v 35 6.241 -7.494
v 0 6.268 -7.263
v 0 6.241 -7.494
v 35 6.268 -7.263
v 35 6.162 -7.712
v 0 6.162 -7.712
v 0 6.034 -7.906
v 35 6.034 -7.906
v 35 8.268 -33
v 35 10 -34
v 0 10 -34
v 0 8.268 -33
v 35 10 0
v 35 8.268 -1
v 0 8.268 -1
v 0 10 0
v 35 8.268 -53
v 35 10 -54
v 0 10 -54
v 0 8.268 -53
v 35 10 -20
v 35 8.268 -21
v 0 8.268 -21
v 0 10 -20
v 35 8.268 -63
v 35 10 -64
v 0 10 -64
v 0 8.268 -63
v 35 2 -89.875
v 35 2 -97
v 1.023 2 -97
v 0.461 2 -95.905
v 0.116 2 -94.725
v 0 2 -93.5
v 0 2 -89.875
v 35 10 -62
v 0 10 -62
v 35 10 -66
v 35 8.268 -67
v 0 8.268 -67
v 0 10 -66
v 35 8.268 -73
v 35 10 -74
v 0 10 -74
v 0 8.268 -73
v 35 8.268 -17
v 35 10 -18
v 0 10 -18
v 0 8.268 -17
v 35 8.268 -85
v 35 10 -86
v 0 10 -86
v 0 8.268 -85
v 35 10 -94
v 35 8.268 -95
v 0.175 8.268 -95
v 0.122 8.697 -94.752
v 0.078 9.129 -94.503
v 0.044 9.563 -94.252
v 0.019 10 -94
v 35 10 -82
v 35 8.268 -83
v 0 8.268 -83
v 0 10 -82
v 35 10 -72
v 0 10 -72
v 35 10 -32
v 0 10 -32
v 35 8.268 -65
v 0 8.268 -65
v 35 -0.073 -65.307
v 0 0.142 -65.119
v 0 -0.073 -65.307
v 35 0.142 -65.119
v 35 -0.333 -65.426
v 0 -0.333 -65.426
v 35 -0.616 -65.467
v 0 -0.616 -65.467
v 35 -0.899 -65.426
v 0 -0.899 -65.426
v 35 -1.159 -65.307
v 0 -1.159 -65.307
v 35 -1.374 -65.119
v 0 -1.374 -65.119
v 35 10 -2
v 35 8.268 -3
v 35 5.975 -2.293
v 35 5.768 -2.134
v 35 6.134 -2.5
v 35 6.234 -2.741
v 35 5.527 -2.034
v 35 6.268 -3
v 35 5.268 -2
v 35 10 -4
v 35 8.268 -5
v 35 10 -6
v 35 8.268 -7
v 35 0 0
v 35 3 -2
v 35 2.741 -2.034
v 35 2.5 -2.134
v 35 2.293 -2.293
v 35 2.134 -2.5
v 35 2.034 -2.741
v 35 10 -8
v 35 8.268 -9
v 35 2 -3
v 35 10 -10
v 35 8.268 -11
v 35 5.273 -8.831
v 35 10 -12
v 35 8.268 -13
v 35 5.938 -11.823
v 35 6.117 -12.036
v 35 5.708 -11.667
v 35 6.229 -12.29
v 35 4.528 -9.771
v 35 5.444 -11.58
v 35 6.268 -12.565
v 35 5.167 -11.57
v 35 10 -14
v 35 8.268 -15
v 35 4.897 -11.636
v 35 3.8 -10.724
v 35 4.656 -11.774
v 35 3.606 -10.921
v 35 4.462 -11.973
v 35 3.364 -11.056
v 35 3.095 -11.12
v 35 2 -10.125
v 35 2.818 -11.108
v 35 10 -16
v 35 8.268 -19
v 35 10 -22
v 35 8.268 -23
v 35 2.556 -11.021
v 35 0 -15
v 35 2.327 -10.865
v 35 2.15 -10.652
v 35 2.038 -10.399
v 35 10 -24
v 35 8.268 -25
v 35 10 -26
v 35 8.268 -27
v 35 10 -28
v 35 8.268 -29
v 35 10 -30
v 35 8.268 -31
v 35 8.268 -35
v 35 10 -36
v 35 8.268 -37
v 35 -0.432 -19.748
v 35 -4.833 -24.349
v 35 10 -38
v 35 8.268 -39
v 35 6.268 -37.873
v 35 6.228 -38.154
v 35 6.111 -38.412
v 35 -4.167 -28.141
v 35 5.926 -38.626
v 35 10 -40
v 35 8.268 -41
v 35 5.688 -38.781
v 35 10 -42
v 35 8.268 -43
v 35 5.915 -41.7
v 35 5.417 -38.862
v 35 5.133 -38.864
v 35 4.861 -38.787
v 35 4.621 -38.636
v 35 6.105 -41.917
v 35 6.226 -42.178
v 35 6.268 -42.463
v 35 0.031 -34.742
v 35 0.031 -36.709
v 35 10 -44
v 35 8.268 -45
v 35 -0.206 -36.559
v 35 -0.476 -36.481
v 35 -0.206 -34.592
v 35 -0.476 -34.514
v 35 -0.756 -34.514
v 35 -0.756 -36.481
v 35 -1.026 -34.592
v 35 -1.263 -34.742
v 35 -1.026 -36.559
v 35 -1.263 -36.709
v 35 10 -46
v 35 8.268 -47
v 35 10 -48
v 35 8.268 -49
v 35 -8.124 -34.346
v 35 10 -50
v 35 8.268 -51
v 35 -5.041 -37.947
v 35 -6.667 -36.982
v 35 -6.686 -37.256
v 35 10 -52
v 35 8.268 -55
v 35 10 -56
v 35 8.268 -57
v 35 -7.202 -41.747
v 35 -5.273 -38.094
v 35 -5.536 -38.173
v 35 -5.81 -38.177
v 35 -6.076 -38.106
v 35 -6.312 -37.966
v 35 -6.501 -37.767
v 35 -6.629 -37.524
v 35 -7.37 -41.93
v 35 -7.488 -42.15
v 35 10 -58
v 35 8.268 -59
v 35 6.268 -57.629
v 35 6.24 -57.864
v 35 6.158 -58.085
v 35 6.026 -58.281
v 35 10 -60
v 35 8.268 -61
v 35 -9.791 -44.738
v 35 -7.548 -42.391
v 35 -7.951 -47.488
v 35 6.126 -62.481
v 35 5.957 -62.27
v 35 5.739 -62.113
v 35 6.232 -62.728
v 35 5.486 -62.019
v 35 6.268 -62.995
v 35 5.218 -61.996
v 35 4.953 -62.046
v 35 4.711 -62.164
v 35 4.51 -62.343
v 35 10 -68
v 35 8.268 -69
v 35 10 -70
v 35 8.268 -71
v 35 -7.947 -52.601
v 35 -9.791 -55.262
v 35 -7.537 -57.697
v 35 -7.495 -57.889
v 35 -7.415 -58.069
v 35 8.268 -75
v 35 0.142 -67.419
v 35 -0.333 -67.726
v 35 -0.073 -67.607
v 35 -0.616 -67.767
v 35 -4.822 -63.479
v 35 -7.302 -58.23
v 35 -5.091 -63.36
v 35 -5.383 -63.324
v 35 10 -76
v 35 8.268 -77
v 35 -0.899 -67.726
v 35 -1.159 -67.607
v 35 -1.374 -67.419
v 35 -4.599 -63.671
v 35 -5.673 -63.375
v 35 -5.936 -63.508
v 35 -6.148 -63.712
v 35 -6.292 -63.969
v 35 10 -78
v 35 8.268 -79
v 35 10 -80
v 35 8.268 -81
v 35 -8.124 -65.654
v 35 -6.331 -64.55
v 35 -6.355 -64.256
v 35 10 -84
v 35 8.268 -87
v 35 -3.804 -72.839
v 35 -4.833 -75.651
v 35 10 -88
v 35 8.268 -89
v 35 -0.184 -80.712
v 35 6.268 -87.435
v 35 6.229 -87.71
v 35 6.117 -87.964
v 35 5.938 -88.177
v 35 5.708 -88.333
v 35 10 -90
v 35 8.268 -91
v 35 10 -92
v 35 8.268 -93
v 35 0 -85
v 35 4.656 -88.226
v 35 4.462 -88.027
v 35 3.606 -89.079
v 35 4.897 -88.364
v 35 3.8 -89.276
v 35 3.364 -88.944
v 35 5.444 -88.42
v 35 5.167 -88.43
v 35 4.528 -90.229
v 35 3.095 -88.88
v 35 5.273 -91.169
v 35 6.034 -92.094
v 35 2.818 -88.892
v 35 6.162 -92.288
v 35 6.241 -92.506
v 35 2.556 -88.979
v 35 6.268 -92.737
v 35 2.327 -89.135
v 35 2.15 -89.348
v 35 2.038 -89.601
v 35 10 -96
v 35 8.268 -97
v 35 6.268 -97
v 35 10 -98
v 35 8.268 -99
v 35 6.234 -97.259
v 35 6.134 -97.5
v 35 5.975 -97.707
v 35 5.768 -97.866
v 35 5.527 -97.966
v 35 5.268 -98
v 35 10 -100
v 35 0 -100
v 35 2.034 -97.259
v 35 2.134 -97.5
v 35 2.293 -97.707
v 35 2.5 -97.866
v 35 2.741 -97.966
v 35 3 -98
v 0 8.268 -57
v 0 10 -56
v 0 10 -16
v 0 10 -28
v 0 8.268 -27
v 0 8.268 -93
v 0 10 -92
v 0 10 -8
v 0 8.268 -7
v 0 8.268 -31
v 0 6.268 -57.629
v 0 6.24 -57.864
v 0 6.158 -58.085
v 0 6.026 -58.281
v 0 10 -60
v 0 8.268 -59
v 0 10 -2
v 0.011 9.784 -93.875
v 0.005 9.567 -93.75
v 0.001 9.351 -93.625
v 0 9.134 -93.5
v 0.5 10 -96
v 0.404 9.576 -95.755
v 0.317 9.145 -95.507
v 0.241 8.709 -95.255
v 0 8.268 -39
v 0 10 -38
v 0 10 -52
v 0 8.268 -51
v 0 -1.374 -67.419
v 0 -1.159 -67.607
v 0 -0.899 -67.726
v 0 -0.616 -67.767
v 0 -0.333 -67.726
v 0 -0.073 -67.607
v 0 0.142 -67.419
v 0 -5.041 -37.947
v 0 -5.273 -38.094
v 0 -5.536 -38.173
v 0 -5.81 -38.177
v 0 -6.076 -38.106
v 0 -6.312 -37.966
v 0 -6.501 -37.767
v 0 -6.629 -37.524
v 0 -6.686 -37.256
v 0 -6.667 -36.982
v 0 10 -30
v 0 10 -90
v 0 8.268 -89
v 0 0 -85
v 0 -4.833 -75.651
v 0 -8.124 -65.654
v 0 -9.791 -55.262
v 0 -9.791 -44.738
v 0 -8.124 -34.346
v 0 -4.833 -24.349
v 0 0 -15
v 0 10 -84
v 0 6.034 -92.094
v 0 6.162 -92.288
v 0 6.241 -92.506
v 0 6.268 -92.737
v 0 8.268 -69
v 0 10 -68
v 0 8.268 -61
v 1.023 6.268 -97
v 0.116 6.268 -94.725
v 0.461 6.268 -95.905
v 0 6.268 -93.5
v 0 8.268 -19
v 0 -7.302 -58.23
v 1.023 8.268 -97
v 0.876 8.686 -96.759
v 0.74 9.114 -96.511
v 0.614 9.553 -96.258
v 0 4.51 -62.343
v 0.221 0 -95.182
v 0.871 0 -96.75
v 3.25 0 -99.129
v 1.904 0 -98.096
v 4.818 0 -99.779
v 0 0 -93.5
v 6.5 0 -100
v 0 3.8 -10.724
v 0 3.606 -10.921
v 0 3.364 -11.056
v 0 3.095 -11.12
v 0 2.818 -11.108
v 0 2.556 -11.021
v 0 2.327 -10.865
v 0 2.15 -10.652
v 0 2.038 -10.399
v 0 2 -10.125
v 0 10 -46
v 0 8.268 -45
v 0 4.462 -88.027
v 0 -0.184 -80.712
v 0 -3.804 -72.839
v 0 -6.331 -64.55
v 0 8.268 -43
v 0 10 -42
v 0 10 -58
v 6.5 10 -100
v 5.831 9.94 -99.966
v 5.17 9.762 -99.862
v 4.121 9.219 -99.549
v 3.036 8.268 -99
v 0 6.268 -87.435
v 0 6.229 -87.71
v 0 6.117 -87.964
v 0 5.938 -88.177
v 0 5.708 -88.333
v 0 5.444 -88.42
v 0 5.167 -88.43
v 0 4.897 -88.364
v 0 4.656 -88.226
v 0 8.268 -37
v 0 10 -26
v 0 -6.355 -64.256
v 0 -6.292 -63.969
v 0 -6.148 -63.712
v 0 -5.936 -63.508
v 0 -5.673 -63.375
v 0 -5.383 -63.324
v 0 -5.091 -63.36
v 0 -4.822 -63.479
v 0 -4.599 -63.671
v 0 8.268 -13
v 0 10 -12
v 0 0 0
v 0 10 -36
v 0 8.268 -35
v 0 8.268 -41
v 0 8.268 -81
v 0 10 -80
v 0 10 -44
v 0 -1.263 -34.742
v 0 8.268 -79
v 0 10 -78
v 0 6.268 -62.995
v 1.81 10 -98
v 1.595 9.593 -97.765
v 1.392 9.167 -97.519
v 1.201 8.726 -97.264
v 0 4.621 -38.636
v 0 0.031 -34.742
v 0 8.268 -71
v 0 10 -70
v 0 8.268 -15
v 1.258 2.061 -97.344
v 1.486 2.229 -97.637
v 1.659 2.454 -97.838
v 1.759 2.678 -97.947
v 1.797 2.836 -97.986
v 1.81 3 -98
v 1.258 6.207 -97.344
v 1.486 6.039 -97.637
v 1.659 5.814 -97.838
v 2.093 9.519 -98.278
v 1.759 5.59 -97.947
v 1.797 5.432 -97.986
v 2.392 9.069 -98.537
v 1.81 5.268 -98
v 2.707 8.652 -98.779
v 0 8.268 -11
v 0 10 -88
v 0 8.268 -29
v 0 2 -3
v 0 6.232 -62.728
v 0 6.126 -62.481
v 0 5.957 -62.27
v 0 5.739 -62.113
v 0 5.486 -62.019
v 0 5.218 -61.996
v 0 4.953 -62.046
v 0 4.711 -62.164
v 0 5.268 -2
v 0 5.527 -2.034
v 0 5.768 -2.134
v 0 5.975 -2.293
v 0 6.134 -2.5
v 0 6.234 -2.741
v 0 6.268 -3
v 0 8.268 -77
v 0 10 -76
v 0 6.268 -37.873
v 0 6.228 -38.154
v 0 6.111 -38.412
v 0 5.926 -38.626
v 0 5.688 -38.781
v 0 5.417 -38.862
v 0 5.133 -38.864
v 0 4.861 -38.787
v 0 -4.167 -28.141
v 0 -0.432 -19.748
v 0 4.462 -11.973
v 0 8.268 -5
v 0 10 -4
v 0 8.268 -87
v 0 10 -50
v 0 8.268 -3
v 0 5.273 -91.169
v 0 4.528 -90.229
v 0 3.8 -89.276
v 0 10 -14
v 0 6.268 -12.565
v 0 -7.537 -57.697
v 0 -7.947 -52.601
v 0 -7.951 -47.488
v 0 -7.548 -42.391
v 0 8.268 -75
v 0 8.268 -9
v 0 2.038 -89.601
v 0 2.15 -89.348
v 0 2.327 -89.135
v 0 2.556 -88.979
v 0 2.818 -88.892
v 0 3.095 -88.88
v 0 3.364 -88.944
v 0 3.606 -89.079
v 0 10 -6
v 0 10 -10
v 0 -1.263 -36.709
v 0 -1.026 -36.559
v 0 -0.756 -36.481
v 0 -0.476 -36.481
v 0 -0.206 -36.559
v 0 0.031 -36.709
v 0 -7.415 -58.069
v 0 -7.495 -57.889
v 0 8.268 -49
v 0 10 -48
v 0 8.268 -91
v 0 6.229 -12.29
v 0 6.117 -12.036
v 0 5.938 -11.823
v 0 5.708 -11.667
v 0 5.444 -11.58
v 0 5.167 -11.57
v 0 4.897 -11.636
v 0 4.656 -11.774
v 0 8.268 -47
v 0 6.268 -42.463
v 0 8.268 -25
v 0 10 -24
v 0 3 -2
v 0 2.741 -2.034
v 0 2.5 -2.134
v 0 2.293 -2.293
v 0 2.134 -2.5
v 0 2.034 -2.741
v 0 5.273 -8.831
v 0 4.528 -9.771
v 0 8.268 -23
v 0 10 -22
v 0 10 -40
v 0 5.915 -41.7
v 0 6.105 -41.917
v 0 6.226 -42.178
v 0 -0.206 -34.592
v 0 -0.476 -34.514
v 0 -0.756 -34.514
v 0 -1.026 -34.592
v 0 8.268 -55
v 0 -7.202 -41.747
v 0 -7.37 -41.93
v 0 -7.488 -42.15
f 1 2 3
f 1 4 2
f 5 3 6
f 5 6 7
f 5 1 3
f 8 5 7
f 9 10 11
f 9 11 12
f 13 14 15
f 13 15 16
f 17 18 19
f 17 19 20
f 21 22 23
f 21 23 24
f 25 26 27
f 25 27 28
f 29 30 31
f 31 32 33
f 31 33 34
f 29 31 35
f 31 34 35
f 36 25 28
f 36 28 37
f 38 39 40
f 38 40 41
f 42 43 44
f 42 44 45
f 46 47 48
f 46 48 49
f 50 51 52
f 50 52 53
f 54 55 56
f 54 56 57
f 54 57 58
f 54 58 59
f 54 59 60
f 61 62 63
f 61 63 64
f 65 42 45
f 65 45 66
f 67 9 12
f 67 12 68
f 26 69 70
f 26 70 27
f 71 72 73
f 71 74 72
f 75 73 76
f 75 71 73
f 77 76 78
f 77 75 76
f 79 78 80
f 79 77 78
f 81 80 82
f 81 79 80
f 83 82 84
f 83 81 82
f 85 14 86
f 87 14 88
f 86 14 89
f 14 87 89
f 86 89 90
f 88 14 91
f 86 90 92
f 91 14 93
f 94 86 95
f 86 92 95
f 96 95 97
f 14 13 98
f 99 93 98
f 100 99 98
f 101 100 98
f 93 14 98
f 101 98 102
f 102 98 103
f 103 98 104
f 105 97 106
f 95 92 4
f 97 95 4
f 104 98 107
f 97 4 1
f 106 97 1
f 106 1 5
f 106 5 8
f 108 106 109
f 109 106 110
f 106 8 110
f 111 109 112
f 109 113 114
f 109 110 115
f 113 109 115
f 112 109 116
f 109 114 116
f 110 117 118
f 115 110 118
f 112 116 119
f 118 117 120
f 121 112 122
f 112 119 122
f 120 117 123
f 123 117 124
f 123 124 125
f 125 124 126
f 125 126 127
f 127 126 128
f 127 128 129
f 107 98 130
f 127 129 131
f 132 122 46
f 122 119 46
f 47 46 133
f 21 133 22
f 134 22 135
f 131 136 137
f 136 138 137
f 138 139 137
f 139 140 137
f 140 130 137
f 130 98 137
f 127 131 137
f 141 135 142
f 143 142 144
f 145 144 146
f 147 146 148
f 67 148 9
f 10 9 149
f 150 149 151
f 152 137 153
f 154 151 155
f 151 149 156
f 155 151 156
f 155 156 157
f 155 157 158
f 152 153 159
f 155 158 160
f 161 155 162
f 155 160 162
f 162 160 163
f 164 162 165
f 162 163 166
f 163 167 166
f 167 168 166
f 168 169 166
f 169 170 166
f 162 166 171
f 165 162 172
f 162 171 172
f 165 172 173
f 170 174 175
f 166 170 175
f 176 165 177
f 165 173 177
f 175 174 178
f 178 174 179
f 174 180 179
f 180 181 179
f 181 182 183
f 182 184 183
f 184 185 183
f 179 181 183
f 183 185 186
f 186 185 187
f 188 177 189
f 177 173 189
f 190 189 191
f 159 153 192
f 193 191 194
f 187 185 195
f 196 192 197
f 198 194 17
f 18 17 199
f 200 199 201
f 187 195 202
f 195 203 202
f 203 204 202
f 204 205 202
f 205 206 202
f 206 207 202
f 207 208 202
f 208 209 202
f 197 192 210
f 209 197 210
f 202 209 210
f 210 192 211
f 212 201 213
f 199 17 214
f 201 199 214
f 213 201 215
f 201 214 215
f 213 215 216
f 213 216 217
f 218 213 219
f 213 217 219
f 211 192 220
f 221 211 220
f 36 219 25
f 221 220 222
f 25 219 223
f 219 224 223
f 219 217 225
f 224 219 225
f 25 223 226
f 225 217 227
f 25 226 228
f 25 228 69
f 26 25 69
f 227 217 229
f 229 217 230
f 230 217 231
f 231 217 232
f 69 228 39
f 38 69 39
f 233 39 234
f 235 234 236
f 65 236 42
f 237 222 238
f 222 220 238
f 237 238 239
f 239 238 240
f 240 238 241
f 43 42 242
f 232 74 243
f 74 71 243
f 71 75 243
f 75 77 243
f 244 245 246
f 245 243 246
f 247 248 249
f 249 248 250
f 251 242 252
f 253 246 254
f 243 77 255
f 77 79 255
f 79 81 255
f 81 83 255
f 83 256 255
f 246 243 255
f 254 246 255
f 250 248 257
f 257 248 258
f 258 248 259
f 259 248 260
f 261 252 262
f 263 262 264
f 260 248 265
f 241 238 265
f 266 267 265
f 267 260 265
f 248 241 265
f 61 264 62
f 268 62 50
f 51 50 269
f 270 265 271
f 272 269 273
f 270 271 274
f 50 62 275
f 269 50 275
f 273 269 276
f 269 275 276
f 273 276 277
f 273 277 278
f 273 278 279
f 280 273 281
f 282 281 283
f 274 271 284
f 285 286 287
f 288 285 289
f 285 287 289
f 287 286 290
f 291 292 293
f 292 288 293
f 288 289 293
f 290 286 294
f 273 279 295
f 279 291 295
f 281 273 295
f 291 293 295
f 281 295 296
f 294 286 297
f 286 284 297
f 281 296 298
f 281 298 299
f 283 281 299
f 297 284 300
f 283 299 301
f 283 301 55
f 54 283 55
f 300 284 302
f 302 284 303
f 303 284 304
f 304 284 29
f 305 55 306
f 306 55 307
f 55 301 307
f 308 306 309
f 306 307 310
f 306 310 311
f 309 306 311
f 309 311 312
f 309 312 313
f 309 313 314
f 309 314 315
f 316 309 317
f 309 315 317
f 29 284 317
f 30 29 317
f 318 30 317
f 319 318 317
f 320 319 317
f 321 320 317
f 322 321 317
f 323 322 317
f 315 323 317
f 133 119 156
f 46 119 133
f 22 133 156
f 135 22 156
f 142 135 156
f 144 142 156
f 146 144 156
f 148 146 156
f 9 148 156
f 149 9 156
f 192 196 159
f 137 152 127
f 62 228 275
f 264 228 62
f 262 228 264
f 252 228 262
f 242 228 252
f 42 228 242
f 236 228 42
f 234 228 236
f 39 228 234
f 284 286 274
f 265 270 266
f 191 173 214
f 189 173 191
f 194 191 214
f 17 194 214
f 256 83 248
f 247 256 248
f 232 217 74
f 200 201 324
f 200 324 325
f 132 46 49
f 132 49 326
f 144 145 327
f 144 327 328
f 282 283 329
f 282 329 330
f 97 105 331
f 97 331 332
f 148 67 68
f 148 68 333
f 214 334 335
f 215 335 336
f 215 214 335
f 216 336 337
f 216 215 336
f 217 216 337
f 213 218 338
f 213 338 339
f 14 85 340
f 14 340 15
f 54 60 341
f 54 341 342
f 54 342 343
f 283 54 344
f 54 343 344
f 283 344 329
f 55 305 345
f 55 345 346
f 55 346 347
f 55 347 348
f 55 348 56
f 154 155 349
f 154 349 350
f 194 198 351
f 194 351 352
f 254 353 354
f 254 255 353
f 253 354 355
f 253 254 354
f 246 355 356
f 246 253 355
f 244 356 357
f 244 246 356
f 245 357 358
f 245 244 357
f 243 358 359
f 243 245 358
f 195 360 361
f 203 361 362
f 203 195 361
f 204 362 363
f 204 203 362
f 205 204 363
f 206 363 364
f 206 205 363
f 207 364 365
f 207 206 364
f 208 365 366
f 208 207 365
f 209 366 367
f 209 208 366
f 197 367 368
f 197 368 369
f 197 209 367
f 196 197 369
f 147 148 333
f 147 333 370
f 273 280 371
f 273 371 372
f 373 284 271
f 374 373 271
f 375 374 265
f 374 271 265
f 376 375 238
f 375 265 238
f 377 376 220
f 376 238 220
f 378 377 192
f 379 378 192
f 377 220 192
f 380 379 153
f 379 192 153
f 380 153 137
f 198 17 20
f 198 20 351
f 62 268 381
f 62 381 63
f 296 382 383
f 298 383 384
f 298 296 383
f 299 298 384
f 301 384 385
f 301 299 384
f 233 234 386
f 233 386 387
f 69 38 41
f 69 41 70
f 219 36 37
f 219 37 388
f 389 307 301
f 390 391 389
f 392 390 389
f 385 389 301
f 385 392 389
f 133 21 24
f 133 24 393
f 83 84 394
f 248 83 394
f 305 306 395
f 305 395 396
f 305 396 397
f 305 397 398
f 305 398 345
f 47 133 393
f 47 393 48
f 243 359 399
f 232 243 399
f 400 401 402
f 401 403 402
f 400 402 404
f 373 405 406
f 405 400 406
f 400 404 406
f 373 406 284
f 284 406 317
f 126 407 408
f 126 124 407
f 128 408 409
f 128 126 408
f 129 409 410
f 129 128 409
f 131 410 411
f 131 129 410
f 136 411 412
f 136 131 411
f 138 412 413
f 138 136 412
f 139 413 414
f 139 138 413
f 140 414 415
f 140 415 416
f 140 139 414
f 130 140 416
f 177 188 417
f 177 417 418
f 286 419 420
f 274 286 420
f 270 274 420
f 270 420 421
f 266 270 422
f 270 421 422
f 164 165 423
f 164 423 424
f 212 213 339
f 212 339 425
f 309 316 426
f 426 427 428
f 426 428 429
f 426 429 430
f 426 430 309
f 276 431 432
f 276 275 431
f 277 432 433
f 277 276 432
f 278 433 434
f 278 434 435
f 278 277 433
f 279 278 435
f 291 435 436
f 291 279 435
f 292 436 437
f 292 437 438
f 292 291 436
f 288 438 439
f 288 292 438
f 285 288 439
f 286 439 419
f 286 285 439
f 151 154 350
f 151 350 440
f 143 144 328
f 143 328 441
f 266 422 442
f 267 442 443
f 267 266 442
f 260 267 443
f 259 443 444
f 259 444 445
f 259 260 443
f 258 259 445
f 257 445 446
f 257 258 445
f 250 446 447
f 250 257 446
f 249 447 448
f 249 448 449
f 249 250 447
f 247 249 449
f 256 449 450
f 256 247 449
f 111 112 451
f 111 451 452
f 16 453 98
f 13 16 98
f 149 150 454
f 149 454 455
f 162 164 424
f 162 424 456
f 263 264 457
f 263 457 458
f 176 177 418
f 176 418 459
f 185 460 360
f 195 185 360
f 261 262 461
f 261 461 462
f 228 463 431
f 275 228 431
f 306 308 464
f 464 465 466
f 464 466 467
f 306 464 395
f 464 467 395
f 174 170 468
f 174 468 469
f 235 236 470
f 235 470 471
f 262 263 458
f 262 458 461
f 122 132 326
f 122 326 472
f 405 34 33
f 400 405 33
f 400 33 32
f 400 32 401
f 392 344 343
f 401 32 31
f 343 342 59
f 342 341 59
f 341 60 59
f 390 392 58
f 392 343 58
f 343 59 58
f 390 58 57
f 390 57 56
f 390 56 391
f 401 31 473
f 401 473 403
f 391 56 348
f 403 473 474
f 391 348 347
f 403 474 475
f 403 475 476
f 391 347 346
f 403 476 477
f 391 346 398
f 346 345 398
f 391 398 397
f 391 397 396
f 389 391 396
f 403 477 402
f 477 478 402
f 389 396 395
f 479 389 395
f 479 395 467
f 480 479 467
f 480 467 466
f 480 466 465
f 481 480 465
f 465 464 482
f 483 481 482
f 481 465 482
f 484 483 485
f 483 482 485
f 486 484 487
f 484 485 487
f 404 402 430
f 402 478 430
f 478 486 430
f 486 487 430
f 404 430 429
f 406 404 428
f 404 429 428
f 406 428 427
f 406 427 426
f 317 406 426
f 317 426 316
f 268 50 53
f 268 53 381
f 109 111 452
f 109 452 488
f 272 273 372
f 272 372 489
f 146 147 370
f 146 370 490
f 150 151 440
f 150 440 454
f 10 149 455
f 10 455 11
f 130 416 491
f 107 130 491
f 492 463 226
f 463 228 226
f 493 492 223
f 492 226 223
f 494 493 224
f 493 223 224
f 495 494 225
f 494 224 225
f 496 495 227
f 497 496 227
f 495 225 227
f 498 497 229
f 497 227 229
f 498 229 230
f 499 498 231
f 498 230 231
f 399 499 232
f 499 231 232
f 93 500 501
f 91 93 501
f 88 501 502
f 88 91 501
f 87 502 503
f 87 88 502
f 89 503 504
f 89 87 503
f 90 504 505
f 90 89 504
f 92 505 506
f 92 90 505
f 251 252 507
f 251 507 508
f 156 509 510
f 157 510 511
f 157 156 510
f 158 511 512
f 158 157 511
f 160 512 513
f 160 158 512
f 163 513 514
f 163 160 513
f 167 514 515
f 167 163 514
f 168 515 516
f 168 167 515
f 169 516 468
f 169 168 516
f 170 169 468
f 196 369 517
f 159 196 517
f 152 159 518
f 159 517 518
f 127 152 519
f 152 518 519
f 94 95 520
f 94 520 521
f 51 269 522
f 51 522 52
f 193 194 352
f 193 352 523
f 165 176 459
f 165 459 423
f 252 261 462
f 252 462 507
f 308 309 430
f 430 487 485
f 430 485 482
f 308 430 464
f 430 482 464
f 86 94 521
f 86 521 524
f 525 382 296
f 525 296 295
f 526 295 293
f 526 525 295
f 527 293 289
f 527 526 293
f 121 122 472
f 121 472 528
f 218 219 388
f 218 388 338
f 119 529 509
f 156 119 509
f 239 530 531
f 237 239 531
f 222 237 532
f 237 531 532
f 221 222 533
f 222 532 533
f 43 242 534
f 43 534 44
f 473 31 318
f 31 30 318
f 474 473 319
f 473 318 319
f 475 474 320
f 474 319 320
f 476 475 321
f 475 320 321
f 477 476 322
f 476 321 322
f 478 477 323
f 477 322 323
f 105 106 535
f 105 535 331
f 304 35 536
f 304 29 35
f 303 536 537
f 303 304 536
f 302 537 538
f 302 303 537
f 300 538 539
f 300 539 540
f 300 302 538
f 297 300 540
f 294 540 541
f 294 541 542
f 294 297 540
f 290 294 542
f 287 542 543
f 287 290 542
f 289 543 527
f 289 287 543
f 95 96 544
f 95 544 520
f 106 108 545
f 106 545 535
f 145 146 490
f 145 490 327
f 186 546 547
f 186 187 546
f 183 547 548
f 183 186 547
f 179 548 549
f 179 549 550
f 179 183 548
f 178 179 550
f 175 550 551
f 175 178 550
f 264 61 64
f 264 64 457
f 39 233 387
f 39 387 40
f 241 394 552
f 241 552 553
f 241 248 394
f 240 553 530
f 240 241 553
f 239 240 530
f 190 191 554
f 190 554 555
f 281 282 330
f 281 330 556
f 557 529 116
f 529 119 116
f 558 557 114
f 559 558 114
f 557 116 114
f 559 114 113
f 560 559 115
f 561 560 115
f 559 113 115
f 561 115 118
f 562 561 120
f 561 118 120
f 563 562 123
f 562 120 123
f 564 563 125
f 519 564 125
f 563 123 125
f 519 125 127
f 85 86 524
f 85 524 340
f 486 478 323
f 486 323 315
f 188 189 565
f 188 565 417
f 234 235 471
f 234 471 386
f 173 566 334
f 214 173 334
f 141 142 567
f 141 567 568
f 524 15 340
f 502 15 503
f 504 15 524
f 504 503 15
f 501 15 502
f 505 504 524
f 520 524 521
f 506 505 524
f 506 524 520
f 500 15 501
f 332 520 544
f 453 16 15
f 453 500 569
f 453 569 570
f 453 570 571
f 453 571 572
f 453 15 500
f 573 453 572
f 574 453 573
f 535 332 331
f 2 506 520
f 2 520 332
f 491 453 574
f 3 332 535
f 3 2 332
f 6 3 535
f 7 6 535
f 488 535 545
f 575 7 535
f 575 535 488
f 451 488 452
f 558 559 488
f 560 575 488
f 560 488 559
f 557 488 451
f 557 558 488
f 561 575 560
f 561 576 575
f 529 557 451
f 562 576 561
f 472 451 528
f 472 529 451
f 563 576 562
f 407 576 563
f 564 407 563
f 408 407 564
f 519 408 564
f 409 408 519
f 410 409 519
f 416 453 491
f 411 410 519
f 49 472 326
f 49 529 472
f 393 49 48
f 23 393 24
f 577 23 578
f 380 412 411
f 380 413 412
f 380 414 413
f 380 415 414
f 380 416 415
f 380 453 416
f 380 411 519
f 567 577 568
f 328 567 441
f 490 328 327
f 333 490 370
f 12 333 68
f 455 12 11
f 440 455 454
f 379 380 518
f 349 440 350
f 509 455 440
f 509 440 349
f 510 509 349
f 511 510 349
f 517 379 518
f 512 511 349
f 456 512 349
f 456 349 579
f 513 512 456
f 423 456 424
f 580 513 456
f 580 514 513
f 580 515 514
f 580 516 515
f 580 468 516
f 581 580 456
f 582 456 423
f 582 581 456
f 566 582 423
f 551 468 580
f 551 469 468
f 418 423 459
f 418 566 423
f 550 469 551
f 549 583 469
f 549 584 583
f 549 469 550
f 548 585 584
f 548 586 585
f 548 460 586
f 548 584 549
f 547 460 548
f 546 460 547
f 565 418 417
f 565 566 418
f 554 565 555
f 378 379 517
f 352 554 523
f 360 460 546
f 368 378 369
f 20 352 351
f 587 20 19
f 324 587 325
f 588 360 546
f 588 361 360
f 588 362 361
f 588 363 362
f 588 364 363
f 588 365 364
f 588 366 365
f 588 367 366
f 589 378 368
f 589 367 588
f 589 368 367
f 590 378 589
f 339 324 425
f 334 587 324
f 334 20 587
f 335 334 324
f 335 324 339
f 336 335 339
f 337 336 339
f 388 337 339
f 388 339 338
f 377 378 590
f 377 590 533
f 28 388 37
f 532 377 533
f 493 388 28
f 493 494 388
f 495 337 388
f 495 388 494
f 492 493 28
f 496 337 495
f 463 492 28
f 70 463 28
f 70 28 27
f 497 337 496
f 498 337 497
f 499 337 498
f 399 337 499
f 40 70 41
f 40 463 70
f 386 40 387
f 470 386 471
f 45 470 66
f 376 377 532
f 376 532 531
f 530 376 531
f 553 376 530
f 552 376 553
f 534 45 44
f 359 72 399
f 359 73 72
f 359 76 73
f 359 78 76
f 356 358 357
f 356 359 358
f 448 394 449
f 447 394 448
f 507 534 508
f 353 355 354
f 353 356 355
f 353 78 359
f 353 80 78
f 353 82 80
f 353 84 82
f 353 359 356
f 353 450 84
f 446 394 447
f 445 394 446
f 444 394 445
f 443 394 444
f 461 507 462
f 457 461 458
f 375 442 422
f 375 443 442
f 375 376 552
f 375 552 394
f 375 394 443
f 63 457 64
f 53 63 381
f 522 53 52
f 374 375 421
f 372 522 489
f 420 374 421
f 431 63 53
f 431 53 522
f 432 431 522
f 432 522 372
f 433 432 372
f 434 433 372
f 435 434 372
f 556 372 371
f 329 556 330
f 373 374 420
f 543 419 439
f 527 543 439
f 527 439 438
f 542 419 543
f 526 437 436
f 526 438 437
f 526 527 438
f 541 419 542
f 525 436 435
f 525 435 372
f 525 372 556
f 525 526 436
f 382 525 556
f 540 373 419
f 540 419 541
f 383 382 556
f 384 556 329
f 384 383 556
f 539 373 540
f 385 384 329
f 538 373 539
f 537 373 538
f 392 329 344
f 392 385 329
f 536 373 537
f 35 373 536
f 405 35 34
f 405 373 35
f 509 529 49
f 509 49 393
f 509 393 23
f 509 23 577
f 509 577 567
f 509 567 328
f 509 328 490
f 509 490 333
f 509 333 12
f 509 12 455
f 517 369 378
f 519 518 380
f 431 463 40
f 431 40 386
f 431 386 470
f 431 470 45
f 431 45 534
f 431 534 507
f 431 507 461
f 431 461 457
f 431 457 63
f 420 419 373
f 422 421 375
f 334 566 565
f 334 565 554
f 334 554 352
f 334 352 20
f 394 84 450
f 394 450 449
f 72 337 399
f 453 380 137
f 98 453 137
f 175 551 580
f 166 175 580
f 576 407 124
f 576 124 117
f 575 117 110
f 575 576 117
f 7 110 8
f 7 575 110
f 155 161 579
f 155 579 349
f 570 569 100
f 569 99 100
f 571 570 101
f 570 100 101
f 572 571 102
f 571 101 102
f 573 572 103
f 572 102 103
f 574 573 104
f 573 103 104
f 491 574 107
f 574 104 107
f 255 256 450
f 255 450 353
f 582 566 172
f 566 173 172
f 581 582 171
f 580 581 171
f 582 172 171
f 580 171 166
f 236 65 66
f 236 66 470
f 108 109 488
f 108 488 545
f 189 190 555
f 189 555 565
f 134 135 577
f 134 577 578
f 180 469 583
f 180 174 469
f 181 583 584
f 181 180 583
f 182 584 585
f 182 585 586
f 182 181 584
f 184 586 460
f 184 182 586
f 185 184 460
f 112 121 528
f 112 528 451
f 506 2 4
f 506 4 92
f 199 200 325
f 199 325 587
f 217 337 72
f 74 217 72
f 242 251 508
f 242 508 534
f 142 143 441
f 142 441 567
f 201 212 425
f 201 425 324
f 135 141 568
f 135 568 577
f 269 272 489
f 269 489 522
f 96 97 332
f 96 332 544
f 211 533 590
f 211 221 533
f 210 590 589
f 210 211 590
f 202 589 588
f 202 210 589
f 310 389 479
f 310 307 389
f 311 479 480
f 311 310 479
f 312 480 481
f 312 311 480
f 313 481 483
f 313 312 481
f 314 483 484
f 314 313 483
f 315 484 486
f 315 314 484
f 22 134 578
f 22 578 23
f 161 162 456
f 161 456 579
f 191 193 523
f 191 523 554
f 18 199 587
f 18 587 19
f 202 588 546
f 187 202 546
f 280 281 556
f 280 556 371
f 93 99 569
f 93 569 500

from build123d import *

# Parameters (mm, degrees)
SKETCH1_W           = 35
SKETCH1_H           = 100
BOSS_EXTRUDE1_DEPTH = 10
CUT_EXTRUDE1_DEPTH  = 107.418983269
LPATTERN1_COUNT     = 50
LPATTERN1_PITCH     = 2
BOSS_EXTRUDE2_DEPTH = 35
FILLET1_R           = 6.5
SKETCH5_W           = 5.628511334
SKETCH5_H           = 4.267949192
CUT_EXTRUDE2_DEPTH  = 107.418983269
FILLET2_R           = 1


with BuildPart() as part:
    # Sketch1 → Boss-Extrude1 (new body)
    with BuildSketch(Plane(origin=(0, 0, 0), x_dir=(1, 0, 0), z_dir=(0, 1, 0))):
        with Locations((17.5, 50)):
            Rectangle(SKETCH1_W, SKETCH1_H)
    extrude(amount=BOSS_EXTRUDE1_DEPTH)

    # Sketch3 → Cut-Extrude1 (cut, through all)
    with BuildSketch(Plane.ZY):
        Polygon((-100, 10), (-99, 8.267949192), (-98, 10), align=None)
    cut_extrude1 = extrude(amount=-CUT_EXTRUDE1_DEPTH, mode=Mode.SUBTRACT)

    # LPattern1: Cut-Extrude1 ×50
    with Locations(*[(0, 0, i * LPATTERN1_PITCH) for i in range(1, LPATTERN1_COUNT)]):
        add(cut_extrude1, mode=Mode.SUBTRACT)

    # Sketch4 → Boss-Extrude2 (add)
    with BuildSketch(Plane(origin=(35, 0, 0), x_dir=(0, 0, -1), z_dir=(1, 0, 0))):
        with BuildLine():
            Line((15, 0), (85, 0))
            ThreePointArc((85, 0), (50, -10), (15, 0))
        make_face()
    extrude(amount=-BOSS_EXTRUDE2_DEPTH)

    # Fillet1
    fillet1_edges = [part.edges().sort_by_distance(p)[0] for p in [
        (0, 5, -100),
    ]]
    fillet(fillet1_edges, radius=FILLET1_R)

    # Sketch5 → Cut-Extrude2 (cut, through all)
    with BuildSketch(Plane.ZY):
        with Locations((-95.185744333, 4.133974596)):
            Rectangle(SKETCH5_W, SKETCH5_H)
        with BuildLine():
            ThreePointArc((-92.371488666, 6.267949192), (-89.617737689, 4.058206439), (-86.748958552, 2))
            Line((-86.748958552, 2), (-92.371488666, 2))
            Line((-92.371488666, 2), (-92.371488666, 6.267949192))
        make_face()
        with BuildLine():
            Line((-60.299711515, 6.267949192), (-90.371488666, 6.267949192))
            ThreePointArc((-90.371488666, 6.267949192), (-76.431686672, -2.311322045), (-60.776399584, -7.08981143))
            Line((-60.776399584, -7.08981143), (-68.299711515, -0.616025404))
            Line((-68.299711515, -0.616025404), (-60.299711515, 6.267949192))
        make_face()
        with BuildLine():
            Line((-42, 6.267949192), (-58, 6.267949192))
            Line((-58, 6.267949192), (-66, -0.616025404))
            Line((-66, -0.616025404), (-58, -7.5))
            ThreePointArc((-58, -7.5), (-50, -8), (-42, -7.5))
            Line((-42, -7.5), (-36.160154055, -0.616025404))
            Line((-36.160154055, -0.616025404), (-42, 6.267949192))
        make_face()
        with BuildLine():
            Line((-9.628511334, 6.267949192), (-40.032965827, 6.267949192))
            Line((-40.032965827, 6.267949192), (-34.193119883, -0.616025404))
            Line((-34.193119883, -0.616025404), (-39.760500511, -7.178819556))
            ThreePointArc((-39.760500511, -7.178819556), (-23.816571501, -2.422741303), (-9.628511334, 6.267949192))
        make_face()
        with Locations((-4.814255667, 4.133974596)):
            Rectangle(SKETCH5_W, SKETCH5_H)
        with BuildLine():
            Line((-7.628511334, 6.267949192), (-7.628511334, 2))
            Line((-7.628511334, 2), (-13.251041448, 2))
            ThreePointArc((-13.251041448, 2), (-10.382262311, 4.058206439), (-7.628511334, 6.267949192))
        make_face()
    extrude(amount=-CUT_EXTRUDE2_DEPTH, mode=Mode.SUBTRACT)

    # Fillet2
    fillet2_edges = [part.edges().sort_by_distance(p)[0] for p in [
        (17.5, -7.5, -58),
        (17.5, -0.616025404, -66),
        (17.5, 6.267949192, -58),
        (17.5, 6.267949192, -42),
        (17.5, -0.616025404, -36.160154055),
        (17.5, -7.5, -42),
        (17.5, 6.267949192, -90.371488666),
        (17.5, 6.267949192, -60.299711515),
        (17.5, -0.616025404, -68.299711515),
        (17.5, -7.08981143, -60.776399584),
        (17.5, 6.267949192, -7.628511334),
        (17.5, 6.267949192, -2),
        (17.5, 2, -2),
        (17.5, 2, -13.251041448),
        (17.5, -7.178819556, -39.760500511),
        (17.5, -0.616025404, -34.193119883),
        (17.5, 6.267949192, -40.032965827),
        (17.5, 6.267949192, -9.628511334),
        (17.5, 2, -86.748958552),
        (18.40479212, 2, -98),
        (18.40479212, 6.267949192, -98),
        (17.5, 6.267949192, -92.371488666),
    ]]
    fillet(fillet2_edges, radius=FILLET2_R)


solid = part.part
